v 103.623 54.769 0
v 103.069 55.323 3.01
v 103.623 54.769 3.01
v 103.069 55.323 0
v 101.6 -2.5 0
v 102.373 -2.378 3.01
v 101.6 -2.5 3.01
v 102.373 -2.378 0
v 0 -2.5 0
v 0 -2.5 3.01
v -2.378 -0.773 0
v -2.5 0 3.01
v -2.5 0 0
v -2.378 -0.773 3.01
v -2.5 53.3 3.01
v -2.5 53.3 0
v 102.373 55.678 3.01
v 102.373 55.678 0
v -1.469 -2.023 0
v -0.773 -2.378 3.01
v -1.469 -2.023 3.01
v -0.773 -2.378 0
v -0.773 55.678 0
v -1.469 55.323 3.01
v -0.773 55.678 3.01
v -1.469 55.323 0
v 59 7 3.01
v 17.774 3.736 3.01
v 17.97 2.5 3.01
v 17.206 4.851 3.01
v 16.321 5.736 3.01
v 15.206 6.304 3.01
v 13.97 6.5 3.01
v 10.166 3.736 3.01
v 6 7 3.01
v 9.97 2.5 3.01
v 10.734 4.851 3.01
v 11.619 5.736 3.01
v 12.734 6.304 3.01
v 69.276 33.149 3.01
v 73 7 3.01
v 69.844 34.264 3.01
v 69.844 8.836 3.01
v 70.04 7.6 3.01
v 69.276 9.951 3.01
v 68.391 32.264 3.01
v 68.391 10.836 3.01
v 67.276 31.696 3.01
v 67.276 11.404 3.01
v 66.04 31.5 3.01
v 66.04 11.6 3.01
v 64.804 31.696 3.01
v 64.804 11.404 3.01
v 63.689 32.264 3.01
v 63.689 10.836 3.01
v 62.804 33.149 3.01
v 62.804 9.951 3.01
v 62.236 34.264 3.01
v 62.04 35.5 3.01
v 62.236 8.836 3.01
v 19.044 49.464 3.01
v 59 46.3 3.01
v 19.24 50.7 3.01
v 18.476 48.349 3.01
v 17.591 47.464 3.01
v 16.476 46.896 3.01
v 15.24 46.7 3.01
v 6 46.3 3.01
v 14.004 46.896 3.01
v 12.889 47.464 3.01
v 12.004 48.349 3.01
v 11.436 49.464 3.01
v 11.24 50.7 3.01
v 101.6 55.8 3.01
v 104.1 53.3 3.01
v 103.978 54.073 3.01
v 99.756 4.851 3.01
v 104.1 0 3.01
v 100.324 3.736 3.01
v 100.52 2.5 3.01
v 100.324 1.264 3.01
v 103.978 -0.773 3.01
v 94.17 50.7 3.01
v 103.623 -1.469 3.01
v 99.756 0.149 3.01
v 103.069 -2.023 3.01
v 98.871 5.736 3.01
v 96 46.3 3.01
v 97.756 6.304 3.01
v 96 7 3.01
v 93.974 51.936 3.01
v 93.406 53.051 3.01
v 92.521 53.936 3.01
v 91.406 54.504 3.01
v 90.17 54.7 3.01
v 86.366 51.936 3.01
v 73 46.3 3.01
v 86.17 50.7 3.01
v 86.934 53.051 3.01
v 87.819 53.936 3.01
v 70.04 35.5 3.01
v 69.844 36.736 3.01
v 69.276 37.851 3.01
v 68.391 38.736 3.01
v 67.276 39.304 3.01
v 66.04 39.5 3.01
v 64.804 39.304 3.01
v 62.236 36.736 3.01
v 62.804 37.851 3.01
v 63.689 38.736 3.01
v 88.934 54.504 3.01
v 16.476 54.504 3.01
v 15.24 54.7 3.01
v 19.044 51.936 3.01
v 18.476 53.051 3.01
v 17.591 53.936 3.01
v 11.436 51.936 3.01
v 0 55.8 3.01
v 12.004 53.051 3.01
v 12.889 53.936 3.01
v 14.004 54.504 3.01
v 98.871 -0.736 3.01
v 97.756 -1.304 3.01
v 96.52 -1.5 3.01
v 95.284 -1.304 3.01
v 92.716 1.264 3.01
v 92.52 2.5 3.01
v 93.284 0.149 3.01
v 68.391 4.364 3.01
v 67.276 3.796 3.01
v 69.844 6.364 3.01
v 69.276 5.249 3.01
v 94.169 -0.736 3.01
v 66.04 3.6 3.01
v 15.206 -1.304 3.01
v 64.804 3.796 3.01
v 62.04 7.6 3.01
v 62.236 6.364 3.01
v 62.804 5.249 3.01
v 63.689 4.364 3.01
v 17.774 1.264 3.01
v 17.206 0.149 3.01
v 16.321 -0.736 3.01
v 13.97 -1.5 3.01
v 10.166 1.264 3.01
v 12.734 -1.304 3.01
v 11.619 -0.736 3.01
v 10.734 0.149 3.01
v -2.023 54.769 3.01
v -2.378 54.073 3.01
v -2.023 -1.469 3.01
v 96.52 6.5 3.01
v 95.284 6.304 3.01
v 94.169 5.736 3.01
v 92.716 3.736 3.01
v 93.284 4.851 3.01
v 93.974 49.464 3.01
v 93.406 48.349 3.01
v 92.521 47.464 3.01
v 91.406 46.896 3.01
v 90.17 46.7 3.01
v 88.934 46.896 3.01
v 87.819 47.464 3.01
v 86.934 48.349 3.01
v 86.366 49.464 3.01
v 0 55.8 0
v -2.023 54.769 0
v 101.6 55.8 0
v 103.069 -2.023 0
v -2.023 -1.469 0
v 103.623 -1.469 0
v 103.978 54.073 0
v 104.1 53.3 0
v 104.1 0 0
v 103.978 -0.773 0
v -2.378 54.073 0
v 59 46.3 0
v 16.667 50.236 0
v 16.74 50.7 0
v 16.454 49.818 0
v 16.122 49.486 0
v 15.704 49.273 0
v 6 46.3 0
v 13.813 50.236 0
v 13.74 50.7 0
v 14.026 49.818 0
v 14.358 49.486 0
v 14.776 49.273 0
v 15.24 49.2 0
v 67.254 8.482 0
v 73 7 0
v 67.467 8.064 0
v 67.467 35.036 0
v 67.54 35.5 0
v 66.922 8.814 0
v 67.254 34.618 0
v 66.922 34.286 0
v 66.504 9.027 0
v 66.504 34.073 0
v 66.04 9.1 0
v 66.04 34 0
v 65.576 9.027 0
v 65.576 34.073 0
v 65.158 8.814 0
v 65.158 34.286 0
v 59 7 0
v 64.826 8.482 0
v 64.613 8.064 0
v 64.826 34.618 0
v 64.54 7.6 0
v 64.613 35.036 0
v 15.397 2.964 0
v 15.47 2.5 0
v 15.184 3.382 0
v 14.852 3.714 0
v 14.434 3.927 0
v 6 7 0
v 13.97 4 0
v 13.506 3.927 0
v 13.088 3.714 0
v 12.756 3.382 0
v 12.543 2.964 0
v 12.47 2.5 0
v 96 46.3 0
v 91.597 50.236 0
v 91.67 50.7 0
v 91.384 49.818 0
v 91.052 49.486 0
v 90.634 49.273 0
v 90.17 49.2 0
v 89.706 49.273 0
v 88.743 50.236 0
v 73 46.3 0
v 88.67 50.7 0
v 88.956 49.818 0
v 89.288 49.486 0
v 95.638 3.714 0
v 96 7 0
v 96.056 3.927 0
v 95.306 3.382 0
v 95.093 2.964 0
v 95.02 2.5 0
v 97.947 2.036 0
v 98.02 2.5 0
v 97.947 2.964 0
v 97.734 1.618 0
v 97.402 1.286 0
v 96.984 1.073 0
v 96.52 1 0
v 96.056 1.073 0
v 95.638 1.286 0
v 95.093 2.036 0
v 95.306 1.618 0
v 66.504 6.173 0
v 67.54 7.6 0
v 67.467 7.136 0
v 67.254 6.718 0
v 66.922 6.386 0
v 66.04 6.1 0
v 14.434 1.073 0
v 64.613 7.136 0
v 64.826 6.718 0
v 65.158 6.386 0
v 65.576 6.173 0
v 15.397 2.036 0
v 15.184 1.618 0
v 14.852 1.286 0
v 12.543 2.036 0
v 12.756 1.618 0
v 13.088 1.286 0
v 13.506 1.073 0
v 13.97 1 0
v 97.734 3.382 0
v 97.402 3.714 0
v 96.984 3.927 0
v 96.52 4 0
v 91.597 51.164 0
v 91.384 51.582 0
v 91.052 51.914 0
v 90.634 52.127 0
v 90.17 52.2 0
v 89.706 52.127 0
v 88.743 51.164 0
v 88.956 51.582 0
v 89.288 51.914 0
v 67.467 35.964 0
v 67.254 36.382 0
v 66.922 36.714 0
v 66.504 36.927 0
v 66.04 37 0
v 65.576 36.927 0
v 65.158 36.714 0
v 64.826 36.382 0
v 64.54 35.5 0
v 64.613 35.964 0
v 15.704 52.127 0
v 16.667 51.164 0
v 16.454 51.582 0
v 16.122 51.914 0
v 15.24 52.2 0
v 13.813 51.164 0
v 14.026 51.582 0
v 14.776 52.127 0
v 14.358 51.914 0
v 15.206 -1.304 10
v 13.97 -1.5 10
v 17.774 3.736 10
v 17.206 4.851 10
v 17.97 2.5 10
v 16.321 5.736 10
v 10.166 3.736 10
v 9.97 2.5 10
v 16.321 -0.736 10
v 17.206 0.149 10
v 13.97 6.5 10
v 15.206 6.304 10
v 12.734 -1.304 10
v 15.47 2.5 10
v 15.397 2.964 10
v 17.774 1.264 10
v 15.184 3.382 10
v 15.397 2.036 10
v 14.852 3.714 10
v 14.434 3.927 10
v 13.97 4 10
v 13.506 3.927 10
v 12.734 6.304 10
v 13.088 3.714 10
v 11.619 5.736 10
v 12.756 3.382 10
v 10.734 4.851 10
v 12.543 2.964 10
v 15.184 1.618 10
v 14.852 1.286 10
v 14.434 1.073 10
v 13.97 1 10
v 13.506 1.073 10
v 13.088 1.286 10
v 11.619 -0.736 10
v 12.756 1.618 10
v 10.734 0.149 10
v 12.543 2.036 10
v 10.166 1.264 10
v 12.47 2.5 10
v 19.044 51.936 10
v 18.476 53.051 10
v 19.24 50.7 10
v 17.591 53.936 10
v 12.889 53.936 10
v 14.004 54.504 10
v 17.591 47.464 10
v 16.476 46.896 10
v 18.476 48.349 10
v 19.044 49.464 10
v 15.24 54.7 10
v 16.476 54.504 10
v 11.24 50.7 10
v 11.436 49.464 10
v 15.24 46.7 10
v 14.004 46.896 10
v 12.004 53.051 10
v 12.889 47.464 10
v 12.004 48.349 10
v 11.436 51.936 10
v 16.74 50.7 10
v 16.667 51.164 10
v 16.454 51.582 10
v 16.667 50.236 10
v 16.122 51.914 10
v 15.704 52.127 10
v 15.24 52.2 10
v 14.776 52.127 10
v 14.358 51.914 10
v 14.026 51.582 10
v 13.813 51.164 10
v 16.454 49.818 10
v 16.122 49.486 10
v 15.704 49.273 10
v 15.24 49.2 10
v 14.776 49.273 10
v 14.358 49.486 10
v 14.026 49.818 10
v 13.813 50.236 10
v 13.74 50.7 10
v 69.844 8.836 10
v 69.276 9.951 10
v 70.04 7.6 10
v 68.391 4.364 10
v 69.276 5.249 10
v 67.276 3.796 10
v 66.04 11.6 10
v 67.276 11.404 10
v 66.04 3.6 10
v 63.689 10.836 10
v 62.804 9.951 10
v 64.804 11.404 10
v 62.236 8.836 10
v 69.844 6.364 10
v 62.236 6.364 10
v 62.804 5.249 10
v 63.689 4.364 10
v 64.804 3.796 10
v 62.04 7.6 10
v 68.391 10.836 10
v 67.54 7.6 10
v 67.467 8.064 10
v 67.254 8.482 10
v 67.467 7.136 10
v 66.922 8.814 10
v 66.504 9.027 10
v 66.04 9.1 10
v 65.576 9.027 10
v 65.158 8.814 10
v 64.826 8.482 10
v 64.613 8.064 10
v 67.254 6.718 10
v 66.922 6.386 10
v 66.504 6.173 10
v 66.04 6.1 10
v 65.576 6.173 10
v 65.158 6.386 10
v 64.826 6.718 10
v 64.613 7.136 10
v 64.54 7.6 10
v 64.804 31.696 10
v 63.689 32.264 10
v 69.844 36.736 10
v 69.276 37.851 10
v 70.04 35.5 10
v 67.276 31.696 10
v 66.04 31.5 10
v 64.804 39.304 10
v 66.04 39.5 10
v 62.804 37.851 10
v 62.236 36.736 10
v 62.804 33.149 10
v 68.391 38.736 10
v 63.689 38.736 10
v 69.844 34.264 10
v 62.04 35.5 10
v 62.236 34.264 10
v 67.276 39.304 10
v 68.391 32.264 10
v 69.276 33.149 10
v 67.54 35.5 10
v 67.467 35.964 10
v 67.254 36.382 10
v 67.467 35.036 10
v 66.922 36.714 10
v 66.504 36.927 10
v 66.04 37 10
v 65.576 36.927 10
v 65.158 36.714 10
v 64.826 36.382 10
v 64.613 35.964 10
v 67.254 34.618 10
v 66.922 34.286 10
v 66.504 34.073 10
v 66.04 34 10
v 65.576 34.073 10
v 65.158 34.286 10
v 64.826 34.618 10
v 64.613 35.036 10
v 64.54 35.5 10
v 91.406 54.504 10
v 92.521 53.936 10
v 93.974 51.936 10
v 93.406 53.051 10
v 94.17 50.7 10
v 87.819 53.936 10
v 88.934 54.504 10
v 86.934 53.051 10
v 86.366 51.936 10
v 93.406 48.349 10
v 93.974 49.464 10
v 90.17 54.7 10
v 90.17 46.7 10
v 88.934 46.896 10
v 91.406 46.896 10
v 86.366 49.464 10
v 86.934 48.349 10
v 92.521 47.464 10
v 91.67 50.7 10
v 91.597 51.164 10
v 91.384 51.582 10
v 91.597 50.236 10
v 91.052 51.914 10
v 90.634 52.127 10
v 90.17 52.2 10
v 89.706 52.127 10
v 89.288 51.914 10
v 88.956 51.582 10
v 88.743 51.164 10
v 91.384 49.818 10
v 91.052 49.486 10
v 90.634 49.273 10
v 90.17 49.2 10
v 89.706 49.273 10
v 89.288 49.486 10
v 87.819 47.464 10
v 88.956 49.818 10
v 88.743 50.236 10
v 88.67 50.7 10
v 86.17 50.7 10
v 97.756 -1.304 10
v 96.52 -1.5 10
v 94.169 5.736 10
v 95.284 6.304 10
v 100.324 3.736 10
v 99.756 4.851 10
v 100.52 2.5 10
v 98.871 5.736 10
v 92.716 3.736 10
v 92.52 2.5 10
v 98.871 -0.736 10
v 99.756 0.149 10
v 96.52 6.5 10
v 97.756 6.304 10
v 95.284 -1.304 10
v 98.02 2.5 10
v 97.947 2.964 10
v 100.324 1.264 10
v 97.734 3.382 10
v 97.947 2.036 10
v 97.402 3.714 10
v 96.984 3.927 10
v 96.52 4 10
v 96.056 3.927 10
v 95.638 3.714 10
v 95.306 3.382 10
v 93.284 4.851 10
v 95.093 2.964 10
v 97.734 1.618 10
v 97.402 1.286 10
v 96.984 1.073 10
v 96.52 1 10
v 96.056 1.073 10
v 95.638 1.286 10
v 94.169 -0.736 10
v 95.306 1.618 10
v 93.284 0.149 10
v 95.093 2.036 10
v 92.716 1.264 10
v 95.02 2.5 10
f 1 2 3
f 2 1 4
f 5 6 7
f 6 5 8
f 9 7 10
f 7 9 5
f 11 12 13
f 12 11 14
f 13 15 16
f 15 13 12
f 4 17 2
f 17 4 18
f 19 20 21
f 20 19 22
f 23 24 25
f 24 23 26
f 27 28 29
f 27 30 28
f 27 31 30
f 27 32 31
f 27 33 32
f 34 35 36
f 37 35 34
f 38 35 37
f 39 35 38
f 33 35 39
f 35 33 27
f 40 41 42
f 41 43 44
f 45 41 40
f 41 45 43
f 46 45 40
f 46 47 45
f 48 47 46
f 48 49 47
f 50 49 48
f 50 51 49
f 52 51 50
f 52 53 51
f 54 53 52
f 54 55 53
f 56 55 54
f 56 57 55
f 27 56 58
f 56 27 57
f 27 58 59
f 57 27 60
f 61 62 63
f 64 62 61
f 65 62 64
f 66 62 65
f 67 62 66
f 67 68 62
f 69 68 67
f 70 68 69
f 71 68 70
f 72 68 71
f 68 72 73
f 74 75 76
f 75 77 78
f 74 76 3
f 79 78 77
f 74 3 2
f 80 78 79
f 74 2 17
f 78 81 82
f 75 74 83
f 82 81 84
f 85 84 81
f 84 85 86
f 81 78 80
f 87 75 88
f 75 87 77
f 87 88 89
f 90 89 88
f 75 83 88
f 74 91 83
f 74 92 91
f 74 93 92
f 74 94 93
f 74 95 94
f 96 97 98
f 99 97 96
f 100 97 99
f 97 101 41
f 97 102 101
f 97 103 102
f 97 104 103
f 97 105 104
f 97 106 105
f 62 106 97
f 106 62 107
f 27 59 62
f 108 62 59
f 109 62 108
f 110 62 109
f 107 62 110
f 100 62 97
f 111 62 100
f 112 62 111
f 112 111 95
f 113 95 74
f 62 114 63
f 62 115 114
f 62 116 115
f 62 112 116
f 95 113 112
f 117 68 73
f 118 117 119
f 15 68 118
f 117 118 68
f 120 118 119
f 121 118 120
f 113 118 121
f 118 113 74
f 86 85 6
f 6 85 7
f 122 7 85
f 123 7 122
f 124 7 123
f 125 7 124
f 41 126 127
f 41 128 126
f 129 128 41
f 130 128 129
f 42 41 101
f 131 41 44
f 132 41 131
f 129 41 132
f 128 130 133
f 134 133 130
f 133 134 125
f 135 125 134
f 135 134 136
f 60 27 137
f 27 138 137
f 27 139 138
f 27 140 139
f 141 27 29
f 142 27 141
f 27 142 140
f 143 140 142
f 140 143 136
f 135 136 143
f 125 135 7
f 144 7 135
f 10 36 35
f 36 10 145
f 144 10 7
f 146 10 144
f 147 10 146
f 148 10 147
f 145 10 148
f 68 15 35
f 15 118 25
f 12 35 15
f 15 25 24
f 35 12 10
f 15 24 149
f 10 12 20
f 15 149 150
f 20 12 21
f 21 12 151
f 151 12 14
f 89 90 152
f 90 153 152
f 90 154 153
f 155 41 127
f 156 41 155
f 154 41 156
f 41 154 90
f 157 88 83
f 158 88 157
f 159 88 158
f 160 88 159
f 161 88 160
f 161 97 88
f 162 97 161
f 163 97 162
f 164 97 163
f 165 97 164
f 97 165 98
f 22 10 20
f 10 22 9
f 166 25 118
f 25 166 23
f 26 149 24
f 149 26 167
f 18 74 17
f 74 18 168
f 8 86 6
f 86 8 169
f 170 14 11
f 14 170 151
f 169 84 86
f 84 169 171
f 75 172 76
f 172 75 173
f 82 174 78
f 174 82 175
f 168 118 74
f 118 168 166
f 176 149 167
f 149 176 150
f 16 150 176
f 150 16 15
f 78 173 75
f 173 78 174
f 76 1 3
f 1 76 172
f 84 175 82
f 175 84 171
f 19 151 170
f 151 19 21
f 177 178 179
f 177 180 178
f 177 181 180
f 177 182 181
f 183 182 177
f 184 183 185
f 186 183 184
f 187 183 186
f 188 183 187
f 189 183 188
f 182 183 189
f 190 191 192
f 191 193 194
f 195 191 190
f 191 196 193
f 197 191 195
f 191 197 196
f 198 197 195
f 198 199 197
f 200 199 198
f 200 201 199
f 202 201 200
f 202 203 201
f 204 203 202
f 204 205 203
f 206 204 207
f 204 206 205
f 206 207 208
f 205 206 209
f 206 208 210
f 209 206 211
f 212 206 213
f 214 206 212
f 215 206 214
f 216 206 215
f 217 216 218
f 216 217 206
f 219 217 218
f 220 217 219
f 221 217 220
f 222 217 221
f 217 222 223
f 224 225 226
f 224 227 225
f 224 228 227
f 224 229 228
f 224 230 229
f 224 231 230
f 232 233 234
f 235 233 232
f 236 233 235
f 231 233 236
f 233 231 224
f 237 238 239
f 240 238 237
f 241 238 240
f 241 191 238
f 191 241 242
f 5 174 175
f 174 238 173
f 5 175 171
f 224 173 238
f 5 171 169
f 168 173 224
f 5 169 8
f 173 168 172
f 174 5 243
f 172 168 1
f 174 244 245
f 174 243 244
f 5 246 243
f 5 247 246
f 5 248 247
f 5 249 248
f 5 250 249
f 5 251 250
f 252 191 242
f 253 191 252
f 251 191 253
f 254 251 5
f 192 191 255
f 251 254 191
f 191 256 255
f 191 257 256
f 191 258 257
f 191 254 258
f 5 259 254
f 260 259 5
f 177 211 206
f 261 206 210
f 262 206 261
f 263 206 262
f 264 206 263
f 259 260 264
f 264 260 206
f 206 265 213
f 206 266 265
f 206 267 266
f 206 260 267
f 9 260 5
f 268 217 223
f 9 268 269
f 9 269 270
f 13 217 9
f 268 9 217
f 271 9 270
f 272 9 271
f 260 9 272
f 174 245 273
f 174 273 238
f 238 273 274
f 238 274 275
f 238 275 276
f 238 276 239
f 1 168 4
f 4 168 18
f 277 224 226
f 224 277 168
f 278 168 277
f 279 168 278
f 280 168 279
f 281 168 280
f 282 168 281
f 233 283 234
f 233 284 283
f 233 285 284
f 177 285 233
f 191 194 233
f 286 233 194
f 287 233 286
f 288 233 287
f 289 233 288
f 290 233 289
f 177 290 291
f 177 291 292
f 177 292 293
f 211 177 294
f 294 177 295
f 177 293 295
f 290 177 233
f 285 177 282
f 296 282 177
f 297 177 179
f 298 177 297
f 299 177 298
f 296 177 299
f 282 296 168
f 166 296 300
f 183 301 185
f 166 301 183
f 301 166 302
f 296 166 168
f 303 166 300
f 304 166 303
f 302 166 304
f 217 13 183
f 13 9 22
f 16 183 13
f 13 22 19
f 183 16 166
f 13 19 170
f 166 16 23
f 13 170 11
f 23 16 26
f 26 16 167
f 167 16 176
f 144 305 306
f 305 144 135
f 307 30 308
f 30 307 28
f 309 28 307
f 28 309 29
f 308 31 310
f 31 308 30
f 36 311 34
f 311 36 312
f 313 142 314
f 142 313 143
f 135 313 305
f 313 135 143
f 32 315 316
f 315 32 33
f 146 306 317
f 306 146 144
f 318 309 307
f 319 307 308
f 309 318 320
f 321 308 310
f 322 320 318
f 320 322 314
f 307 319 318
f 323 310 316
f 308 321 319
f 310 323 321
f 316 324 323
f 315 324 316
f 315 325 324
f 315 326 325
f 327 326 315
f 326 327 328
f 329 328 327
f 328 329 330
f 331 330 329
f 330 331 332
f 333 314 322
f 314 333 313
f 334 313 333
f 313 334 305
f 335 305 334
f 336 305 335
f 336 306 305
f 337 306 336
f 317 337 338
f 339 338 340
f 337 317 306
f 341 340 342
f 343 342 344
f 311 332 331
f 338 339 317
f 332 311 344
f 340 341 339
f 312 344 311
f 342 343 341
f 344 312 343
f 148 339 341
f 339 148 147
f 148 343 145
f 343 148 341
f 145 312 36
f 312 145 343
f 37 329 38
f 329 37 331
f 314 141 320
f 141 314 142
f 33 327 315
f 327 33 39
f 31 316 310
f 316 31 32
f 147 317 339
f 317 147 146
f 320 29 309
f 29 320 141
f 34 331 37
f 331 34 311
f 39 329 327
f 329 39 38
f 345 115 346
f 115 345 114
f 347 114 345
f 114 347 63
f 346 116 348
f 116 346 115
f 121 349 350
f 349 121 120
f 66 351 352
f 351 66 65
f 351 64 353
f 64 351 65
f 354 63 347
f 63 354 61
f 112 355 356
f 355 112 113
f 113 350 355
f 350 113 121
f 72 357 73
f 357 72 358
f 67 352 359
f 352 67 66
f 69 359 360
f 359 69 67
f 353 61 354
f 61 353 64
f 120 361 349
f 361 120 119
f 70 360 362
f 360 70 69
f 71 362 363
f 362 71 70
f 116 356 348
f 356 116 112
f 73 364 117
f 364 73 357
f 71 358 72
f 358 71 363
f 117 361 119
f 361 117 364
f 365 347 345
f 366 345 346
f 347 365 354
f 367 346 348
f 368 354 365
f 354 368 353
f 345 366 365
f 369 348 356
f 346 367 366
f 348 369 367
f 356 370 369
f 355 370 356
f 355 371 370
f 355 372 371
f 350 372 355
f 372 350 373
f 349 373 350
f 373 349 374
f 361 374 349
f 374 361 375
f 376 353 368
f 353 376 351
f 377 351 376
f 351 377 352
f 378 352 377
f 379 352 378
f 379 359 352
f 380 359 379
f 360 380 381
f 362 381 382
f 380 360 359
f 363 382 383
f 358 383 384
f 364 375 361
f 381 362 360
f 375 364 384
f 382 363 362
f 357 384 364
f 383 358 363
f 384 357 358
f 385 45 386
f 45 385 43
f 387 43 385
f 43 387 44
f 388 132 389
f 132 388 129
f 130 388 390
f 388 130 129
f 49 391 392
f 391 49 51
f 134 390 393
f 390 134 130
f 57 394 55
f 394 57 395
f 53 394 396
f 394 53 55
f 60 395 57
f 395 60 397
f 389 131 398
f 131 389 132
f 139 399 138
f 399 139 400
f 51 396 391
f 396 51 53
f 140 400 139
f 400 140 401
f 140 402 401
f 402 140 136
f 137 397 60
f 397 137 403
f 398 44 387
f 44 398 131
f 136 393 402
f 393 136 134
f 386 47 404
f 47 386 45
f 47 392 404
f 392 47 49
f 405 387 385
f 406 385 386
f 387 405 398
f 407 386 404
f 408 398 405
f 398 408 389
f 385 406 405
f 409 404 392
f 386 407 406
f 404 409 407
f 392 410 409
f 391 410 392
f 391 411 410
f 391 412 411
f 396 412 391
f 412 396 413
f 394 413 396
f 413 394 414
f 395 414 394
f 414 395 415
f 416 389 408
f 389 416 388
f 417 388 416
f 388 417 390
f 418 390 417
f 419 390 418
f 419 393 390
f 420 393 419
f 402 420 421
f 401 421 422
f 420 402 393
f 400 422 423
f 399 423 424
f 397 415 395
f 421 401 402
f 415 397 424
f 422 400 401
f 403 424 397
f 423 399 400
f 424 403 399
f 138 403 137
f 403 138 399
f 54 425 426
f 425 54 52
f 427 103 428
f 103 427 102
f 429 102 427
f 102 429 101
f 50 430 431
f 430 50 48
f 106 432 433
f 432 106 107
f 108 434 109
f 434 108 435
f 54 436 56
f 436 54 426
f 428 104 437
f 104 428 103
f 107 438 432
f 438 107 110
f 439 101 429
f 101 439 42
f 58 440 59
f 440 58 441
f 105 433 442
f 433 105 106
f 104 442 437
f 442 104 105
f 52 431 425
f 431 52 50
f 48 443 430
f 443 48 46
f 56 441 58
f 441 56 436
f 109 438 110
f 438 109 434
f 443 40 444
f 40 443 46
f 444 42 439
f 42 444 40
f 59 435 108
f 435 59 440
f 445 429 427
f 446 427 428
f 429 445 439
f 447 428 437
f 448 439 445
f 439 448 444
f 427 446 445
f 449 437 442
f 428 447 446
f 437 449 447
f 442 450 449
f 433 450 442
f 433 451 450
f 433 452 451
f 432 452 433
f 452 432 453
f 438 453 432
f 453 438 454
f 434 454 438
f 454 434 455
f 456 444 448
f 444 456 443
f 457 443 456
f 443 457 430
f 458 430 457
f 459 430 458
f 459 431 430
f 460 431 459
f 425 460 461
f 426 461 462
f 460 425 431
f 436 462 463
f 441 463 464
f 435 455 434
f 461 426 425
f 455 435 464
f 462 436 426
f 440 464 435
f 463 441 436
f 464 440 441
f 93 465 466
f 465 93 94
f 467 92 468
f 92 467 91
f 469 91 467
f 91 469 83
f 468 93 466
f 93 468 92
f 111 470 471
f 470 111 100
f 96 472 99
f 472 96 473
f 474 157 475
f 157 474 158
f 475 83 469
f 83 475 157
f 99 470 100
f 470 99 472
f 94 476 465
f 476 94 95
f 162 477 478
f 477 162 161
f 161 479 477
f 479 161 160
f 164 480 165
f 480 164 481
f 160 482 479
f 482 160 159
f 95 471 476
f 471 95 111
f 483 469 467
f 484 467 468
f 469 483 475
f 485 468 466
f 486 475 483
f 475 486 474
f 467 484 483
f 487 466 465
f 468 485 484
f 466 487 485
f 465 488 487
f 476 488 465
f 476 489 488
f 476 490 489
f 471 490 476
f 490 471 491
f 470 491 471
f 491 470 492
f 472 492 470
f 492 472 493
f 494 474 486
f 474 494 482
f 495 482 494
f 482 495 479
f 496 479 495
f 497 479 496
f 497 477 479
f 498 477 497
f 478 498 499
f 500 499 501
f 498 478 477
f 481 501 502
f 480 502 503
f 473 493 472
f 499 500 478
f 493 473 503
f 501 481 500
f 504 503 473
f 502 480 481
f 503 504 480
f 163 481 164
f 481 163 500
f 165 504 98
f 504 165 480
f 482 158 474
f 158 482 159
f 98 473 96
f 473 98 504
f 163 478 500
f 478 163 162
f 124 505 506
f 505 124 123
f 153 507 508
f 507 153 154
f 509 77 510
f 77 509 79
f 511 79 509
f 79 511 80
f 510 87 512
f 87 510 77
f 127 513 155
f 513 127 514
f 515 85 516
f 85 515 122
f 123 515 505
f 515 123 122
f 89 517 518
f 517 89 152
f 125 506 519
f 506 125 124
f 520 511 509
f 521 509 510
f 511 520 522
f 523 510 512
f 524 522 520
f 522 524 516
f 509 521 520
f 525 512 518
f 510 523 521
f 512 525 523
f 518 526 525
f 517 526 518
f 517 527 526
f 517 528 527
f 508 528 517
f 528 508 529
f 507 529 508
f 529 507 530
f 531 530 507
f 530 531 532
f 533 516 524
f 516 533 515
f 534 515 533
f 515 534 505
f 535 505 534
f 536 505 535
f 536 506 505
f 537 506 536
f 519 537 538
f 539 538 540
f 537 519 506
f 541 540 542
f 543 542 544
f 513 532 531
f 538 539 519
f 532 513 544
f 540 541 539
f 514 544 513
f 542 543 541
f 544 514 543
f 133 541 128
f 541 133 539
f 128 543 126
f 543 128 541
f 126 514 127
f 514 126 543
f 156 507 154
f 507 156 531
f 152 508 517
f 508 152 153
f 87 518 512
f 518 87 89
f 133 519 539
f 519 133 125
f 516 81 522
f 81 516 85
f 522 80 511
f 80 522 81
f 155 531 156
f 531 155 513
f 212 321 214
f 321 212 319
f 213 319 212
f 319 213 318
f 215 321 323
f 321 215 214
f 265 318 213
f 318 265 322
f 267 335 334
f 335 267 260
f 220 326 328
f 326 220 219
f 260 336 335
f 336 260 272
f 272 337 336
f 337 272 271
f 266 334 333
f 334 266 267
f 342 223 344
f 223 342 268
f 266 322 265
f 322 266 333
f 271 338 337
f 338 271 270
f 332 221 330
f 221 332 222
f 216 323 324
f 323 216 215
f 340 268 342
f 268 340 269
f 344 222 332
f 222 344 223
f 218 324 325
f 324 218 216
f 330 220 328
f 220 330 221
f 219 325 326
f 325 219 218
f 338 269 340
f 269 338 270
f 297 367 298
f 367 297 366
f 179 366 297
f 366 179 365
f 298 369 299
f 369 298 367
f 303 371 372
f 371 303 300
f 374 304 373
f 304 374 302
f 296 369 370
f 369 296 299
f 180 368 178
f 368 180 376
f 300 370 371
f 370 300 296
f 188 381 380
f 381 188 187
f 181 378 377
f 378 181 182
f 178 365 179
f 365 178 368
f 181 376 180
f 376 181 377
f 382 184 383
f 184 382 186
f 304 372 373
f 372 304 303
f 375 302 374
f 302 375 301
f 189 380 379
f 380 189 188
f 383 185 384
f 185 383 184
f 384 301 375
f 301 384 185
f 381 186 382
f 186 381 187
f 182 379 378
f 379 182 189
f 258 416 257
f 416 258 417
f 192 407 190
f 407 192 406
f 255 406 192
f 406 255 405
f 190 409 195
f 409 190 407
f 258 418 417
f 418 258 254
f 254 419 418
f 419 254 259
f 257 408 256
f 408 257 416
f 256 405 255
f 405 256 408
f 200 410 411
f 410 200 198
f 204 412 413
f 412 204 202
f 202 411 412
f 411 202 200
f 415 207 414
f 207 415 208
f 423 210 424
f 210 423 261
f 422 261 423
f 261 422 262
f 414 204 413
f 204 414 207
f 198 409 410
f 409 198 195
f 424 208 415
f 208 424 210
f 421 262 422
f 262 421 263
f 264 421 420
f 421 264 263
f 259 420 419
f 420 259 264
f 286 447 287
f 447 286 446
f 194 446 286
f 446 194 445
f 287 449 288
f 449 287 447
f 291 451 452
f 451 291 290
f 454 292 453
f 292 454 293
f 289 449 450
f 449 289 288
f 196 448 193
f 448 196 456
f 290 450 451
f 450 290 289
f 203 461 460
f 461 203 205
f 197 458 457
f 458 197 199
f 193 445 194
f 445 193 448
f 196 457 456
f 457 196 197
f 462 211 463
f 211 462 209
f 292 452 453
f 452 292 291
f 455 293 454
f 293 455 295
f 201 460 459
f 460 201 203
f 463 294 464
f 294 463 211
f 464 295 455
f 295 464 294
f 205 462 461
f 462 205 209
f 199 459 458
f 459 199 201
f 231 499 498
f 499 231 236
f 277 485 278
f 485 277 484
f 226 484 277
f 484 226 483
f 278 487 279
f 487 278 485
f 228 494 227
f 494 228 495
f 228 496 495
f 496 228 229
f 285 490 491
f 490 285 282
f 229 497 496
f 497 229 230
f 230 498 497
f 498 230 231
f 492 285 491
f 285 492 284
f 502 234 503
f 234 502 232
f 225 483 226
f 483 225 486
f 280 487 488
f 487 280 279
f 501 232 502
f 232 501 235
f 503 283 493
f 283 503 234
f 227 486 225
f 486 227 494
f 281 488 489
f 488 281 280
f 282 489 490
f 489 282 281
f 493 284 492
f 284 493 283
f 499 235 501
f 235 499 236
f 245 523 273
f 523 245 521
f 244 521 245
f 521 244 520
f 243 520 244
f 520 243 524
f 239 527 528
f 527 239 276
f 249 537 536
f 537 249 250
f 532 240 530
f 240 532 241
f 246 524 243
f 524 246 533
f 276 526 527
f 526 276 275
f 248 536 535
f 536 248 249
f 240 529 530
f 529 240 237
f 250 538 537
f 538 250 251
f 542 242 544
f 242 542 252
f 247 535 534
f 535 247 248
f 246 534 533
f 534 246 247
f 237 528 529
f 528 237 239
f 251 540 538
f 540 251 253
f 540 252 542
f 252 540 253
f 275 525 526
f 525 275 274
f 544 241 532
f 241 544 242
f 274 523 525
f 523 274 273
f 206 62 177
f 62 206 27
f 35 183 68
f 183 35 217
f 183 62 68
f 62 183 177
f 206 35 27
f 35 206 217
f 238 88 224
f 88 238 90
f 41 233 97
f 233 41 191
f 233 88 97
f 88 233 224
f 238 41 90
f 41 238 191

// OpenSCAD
$fn=20;
difference(){
union(){
minkowski(){
    cube([101.6,53.3,3]);
    cylinder(d=5,h=0.01);
}
translate([13.97,2.5,0])cylinder(d=8,h=10);
translate([15.24,50.7,0])cylinder(d=8,h=10);
translate([66.04,7.6,0])cylinder(d=8,h=10);
translate([66.04,35.5,0])cylinder(d=8,h=10);
translate([90.17,50.7,0])cylinder(d=8,h=10);
translate([96.52,2.5,0])cylinder(d=8,h=10);
}
translate([13.97,2.5,0])cylinder(d=3,h=10);
translate([15.24,50.7,0])cylinder(d=3,h=10);
translate([66.04,7.6,0])cylinder(d=3,h=10);
translate([66.04,35.5,0])cylinder(d=3,h=10);
translate([90.17,50.7,0])cylinder(d=3,h=10);
translate([96.52,2.5,0])cylinder(d=3,h=10);

translate([6,7,-1])cube([53,39.3,5]);
translate([73,7,-1])cube([23,39.3,5]);
}
